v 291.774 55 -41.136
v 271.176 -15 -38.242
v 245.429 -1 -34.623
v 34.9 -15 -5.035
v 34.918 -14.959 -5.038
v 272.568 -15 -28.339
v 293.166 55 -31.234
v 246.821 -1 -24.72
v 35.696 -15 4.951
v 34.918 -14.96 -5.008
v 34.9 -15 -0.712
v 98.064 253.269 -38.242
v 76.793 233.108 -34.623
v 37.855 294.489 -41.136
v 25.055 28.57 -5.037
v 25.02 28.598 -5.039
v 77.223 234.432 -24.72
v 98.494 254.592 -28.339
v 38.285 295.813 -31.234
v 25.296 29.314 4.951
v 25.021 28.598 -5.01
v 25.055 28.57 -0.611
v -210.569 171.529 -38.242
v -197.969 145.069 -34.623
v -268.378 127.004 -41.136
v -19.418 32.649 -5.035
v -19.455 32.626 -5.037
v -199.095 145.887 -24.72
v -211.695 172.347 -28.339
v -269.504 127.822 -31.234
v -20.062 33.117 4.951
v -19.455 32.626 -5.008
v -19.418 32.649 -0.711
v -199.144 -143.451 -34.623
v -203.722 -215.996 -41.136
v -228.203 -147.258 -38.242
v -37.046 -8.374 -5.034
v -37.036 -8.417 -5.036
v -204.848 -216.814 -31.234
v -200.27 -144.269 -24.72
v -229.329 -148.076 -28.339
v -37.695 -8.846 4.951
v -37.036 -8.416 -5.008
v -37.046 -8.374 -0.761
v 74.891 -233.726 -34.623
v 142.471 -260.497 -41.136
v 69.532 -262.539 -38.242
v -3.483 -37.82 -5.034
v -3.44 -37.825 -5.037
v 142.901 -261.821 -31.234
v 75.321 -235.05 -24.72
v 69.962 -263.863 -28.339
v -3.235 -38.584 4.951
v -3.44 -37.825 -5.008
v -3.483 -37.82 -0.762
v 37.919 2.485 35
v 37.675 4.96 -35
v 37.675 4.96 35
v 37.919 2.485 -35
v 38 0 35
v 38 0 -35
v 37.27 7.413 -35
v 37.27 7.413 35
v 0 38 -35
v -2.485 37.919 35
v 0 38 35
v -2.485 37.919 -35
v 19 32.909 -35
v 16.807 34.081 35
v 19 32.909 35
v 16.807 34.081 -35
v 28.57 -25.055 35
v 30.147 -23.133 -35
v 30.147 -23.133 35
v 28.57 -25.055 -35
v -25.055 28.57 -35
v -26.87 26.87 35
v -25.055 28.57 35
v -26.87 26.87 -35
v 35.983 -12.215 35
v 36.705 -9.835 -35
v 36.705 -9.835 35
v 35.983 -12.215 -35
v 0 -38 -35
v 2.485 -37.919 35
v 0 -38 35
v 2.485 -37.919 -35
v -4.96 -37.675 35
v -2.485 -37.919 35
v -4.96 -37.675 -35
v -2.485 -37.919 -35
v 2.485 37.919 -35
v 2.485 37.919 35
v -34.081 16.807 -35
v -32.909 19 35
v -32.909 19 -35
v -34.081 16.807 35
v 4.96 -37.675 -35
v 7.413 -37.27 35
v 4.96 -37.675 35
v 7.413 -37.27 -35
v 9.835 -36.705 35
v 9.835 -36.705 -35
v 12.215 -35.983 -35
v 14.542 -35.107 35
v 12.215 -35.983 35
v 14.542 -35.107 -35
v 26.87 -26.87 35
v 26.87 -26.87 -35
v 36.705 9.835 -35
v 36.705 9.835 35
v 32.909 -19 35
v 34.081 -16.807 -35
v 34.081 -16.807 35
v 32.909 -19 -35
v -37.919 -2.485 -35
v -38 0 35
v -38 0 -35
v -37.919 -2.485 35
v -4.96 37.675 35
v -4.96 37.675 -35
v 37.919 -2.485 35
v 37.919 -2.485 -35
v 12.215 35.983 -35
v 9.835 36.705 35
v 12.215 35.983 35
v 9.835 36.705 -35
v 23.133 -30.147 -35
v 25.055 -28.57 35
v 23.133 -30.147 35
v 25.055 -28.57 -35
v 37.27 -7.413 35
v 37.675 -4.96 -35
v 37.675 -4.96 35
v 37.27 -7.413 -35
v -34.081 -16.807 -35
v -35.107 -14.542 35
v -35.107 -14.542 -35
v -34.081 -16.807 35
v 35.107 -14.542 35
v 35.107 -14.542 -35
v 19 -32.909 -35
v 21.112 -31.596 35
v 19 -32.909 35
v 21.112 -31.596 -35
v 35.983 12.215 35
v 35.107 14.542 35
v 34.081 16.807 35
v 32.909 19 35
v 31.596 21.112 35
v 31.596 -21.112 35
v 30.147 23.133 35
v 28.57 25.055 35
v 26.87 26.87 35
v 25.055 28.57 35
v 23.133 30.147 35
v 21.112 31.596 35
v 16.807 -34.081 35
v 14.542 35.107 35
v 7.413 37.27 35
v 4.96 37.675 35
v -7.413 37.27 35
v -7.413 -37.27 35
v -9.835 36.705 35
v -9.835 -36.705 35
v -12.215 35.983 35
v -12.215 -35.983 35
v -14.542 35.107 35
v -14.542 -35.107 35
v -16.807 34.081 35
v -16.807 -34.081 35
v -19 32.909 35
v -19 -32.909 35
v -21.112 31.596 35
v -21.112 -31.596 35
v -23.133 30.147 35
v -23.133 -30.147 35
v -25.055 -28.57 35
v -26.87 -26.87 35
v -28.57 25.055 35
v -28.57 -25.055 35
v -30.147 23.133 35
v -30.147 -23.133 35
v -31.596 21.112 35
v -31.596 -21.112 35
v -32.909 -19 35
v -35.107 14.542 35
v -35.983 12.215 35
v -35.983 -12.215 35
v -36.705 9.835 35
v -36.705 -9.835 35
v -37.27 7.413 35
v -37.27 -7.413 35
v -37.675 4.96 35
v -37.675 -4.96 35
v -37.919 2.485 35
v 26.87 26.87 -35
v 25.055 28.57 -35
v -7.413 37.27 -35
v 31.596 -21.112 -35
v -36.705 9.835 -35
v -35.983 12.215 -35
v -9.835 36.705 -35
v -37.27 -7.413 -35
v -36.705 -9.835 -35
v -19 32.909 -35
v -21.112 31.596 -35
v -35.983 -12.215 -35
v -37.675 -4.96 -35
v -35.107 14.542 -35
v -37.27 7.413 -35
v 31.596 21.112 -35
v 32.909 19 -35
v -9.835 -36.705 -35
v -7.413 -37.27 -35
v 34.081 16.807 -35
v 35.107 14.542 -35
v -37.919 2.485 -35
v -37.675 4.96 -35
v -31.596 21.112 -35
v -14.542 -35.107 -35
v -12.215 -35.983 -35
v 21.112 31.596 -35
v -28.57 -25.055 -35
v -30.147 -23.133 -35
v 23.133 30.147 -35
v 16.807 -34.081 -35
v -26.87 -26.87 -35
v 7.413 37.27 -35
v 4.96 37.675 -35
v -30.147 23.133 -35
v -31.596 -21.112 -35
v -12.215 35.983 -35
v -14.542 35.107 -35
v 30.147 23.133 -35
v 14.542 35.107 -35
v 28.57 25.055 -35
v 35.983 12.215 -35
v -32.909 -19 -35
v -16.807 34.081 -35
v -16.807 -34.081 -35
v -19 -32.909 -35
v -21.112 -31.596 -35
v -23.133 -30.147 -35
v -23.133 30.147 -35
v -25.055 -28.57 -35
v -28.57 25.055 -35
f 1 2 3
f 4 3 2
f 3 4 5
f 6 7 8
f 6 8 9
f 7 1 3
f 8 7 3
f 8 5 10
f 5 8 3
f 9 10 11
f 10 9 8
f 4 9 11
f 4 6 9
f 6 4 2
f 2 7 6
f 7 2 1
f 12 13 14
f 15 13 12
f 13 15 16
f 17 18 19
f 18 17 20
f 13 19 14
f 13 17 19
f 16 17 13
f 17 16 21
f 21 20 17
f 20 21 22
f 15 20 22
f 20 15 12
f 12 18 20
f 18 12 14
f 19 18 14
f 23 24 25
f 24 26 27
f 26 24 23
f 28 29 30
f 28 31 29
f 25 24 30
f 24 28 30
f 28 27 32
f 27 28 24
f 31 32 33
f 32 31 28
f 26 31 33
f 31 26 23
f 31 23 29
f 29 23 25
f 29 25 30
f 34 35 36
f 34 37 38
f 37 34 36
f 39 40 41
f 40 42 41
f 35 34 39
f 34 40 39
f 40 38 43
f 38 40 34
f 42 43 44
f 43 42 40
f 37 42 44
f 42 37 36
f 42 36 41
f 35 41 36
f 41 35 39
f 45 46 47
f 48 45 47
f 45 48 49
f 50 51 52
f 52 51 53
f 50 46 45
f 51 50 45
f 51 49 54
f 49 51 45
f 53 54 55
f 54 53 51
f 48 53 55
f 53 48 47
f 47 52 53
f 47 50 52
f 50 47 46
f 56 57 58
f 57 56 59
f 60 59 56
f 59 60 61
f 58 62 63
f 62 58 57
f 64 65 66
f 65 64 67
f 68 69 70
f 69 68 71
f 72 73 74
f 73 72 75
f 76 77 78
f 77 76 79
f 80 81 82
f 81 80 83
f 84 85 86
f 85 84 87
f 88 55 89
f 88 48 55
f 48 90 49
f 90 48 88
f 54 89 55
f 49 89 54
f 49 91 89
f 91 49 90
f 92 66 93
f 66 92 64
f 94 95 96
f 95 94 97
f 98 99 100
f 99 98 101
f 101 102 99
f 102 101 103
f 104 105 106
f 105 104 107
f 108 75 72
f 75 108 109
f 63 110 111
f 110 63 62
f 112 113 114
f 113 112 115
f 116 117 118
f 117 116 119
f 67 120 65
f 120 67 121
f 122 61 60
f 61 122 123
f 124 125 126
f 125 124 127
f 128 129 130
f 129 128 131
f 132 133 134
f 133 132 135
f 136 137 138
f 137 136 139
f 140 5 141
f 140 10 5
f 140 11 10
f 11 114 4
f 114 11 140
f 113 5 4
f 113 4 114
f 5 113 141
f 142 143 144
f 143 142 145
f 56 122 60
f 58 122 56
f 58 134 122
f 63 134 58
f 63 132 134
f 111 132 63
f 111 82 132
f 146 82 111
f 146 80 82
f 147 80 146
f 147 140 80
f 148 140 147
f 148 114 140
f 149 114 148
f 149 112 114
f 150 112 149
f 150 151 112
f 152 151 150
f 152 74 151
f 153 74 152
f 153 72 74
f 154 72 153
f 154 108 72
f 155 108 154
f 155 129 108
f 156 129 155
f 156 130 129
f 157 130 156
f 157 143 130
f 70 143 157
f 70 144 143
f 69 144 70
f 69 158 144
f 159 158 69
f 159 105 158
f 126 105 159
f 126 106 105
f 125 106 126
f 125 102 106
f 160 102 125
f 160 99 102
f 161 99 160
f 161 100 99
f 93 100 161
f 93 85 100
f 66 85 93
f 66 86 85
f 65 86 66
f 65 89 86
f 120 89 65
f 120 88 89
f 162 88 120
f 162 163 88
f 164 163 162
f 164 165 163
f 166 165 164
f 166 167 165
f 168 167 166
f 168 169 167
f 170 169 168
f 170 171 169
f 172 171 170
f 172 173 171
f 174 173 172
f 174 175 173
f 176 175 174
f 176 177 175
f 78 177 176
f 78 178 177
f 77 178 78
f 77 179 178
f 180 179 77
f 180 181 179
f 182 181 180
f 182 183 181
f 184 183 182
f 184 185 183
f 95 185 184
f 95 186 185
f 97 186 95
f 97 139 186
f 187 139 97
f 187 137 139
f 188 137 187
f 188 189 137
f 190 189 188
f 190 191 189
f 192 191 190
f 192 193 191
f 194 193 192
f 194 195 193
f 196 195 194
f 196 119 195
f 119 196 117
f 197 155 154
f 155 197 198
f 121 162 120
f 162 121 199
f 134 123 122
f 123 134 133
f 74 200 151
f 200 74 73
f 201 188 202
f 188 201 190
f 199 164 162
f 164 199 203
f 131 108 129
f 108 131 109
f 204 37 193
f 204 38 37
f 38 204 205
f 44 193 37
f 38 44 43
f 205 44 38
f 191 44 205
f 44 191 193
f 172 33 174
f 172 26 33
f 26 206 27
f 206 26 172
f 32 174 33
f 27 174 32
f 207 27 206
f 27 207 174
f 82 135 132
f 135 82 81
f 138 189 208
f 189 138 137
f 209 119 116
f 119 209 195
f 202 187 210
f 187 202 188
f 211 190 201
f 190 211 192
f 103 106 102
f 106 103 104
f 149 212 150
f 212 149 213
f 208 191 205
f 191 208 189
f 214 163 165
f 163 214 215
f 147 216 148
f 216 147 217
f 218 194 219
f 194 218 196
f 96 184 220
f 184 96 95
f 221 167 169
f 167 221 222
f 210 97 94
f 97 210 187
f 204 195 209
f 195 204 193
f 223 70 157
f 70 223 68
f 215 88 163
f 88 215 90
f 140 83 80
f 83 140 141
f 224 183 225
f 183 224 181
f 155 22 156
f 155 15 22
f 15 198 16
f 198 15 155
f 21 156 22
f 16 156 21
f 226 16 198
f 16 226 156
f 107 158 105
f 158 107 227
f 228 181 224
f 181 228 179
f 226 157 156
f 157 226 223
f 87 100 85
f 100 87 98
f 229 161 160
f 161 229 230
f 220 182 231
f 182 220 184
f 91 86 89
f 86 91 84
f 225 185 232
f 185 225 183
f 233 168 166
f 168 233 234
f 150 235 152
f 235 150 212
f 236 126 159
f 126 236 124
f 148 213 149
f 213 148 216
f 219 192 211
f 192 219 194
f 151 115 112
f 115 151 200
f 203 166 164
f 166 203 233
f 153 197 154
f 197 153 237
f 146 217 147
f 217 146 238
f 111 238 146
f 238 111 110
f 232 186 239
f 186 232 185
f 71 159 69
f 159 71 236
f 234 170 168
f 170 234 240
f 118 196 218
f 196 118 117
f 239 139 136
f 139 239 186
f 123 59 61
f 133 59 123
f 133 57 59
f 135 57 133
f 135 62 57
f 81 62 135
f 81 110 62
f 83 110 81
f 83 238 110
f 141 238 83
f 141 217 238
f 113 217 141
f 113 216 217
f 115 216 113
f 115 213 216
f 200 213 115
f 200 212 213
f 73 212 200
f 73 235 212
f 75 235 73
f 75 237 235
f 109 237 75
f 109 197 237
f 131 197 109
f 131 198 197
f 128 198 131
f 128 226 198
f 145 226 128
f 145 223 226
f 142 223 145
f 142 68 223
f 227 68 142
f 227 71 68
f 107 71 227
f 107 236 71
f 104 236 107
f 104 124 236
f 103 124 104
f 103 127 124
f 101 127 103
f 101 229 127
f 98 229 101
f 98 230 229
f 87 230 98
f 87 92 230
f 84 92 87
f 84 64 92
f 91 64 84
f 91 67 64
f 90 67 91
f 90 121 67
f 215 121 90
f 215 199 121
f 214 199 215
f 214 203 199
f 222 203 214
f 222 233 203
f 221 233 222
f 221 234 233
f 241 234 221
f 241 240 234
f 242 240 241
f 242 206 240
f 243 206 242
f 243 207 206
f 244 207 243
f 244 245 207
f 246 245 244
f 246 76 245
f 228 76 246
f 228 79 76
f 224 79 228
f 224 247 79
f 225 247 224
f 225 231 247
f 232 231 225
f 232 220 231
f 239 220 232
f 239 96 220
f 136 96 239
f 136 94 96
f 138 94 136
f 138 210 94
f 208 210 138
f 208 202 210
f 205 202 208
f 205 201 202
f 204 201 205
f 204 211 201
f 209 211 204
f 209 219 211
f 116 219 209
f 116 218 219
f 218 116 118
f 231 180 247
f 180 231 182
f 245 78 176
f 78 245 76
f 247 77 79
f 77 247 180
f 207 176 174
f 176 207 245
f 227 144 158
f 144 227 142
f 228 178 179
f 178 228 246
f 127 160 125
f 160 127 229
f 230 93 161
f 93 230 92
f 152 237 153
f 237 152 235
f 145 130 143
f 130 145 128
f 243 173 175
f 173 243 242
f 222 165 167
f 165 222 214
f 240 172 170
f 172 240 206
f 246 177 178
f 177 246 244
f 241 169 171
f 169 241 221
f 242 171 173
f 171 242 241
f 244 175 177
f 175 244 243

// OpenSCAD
// Biupiu marine propulsor blockout — concept/research geometry only.
module hub(r=38,h=70){ cylinder(r=r,h=h,center=true,$fn=96); }
module blade(len=260,width=70,thick=10){ linear_extrude(height=thick,center=true) polygon([[0,0],[len*0.82,width*0.20],[len,width],[len*0.92,0]]); }
module propulsor(n=5){ hub(); for(i=[0:n-1]) rotate([0,0,i*360/n]) translate([35,-15,0]) rotate([0,8,0]) blade(); }
propulsor();
